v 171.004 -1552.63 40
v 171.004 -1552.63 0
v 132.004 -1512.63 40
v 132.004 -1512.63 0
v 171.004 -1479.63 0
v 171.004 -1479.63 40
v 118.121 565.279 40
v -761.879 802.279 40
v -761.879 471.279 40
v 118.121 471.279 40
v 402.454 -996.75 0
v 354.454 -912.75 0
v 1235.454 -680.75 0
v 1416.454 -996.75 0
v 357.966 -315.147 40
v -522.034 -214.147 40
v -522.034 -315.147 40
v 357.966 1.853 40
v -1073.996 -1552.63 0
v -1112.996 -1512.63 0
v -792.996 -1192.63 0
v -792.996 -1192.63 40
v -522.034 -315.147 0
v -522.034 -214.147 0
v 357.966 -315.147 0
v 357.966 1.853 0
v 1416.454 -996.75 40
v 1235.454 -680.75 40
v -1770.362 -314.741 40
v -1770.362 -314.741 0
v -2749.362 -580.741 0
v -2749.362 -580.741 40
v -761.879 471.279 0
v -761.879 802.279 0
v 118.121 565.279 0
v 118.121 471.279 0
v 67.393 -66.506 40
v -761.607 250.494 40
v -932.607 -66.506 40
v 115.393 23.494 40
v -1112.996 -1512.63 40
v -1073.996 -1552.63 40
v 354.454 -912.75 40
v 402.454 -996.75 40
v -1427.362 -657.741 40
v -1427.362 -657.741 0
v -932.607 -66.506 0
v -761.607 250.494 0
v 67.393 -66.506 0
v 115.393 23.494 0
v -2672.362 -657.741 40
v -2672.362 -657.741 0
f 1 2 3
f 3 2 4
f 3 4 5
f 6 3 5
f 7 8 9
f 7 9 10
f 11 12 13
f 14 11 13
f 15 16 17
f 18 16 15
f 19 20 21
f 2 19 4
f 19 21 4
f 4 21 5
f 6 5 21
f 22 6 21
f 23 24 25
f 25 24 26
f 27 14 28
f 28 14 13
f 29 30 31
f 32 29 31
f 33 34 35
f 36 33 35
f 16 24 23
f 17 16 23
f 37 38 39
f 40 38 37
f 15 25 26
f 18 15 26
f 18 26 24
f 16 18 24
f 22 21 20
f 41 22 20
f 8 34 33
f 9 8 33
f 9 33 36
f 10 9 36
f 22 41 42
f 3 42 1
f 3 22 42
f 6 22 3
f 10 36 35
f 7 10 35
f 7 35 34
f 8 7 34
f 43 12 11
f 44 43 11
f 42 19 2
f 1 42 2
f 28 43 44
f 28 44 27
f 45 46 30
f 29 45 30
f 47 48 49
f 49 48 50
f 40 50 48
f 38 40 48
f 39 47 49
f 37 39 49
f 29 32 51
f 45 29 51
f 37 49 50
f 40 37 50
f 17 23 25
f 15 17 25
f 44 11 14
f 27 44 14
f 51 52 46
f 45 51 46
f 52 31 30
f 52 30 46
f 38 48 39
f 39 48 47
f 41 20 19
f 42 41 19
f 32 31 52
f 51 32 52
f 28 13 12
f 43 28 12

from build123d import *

# Parameters (mm, degrees)
F1_DEPTH  = 40
F3_DEPTH  = 25
F4_DEPTH  = 40
F6_DEPTH  = 40
F8_DEPTH  = 40
F10_DEPTH = 40
F12_DEPTH = 40


with BuildPart() as f1:
    # F0 (on Top) → F1 (new body)
    with BuildSketch(Plane.XY):
        Polygon((357.966052, 1.853428), (-522.033948, -214.146572), (-522.033948, -315.146572), (357.966052, -315.146572), align=None)
    extrude(amount=F1_DEPTH)


with BuildPart() as f3:
    # F2 (on Top) → F3 (new body)
    with BuildSketch(Plane.XY):
        Polygon((-761.606879, 250.493593), (-932.606879, -66.506407), (67.393121, -66.506407), (115.393121, 23.493593), align=None)
    extrude(amount=F3_DEPTH)

    # F2 (on Top) → F4 (join)
    with BuildSketch(Plane.XY):
        Polygon((-761.606879, 250.493593), (-932.606879, -66.506407), (67.393121, -66.506407), (115.393121, 23.493593), align=None)
    extrude(amount=F4_DEPTH)


with BuildPart() as f6:
    # F5 (on Top) → F6 (new body)
    with BuildSketch(Plane.XY):
        Polygon((171.004112, -1479.629545), (-792.995888, -1192.629545), (-1112.995888, -1512.629545), (-1073.995888, -1552.629545), (171.004112, -1552.629545), (132.004112, -1512.629545), align=None)
    extrude(amount=F6_DEPTH)


with BuildPart() as f8:
    # F7 (on Top) → F8 (new body)
    with BuildSketch(Plane.XY):
        Polygon((-1770.361581, -314.740785), (-2749.361581, -580.740785), (-2672.361581, -657.740785), (-1427.361581, -657.740785), align=None)
    extrude(amount=F8_DEPTH)


with BuildPart() as f10:
    # F9 (on Top) → F10 (new body)
    with BuildSketch(Plane.XY):
        Polygon((1235.453922, -680.750228), (354.453922, -912.750228), (402.453922, -996.750228), (1416.453922, -996.750228), align=None)
    extrude(amount=F10_DEPTH)


with BuildPart() as f12:
    # F11 (on Top) → F12 (new body)
    with BuildSketch(Plane.XY):
        Polygon((118.121295, 565.279308), (-761.878705, 802.279308), (-761.878705, 471.279308), (118.121295, 471.279308), align=None)
    extrude(amount=F12_DEPTH)


solid = Compound([f1.part, f3.part, f6.part, f8.part, f10.part, f12.part])
